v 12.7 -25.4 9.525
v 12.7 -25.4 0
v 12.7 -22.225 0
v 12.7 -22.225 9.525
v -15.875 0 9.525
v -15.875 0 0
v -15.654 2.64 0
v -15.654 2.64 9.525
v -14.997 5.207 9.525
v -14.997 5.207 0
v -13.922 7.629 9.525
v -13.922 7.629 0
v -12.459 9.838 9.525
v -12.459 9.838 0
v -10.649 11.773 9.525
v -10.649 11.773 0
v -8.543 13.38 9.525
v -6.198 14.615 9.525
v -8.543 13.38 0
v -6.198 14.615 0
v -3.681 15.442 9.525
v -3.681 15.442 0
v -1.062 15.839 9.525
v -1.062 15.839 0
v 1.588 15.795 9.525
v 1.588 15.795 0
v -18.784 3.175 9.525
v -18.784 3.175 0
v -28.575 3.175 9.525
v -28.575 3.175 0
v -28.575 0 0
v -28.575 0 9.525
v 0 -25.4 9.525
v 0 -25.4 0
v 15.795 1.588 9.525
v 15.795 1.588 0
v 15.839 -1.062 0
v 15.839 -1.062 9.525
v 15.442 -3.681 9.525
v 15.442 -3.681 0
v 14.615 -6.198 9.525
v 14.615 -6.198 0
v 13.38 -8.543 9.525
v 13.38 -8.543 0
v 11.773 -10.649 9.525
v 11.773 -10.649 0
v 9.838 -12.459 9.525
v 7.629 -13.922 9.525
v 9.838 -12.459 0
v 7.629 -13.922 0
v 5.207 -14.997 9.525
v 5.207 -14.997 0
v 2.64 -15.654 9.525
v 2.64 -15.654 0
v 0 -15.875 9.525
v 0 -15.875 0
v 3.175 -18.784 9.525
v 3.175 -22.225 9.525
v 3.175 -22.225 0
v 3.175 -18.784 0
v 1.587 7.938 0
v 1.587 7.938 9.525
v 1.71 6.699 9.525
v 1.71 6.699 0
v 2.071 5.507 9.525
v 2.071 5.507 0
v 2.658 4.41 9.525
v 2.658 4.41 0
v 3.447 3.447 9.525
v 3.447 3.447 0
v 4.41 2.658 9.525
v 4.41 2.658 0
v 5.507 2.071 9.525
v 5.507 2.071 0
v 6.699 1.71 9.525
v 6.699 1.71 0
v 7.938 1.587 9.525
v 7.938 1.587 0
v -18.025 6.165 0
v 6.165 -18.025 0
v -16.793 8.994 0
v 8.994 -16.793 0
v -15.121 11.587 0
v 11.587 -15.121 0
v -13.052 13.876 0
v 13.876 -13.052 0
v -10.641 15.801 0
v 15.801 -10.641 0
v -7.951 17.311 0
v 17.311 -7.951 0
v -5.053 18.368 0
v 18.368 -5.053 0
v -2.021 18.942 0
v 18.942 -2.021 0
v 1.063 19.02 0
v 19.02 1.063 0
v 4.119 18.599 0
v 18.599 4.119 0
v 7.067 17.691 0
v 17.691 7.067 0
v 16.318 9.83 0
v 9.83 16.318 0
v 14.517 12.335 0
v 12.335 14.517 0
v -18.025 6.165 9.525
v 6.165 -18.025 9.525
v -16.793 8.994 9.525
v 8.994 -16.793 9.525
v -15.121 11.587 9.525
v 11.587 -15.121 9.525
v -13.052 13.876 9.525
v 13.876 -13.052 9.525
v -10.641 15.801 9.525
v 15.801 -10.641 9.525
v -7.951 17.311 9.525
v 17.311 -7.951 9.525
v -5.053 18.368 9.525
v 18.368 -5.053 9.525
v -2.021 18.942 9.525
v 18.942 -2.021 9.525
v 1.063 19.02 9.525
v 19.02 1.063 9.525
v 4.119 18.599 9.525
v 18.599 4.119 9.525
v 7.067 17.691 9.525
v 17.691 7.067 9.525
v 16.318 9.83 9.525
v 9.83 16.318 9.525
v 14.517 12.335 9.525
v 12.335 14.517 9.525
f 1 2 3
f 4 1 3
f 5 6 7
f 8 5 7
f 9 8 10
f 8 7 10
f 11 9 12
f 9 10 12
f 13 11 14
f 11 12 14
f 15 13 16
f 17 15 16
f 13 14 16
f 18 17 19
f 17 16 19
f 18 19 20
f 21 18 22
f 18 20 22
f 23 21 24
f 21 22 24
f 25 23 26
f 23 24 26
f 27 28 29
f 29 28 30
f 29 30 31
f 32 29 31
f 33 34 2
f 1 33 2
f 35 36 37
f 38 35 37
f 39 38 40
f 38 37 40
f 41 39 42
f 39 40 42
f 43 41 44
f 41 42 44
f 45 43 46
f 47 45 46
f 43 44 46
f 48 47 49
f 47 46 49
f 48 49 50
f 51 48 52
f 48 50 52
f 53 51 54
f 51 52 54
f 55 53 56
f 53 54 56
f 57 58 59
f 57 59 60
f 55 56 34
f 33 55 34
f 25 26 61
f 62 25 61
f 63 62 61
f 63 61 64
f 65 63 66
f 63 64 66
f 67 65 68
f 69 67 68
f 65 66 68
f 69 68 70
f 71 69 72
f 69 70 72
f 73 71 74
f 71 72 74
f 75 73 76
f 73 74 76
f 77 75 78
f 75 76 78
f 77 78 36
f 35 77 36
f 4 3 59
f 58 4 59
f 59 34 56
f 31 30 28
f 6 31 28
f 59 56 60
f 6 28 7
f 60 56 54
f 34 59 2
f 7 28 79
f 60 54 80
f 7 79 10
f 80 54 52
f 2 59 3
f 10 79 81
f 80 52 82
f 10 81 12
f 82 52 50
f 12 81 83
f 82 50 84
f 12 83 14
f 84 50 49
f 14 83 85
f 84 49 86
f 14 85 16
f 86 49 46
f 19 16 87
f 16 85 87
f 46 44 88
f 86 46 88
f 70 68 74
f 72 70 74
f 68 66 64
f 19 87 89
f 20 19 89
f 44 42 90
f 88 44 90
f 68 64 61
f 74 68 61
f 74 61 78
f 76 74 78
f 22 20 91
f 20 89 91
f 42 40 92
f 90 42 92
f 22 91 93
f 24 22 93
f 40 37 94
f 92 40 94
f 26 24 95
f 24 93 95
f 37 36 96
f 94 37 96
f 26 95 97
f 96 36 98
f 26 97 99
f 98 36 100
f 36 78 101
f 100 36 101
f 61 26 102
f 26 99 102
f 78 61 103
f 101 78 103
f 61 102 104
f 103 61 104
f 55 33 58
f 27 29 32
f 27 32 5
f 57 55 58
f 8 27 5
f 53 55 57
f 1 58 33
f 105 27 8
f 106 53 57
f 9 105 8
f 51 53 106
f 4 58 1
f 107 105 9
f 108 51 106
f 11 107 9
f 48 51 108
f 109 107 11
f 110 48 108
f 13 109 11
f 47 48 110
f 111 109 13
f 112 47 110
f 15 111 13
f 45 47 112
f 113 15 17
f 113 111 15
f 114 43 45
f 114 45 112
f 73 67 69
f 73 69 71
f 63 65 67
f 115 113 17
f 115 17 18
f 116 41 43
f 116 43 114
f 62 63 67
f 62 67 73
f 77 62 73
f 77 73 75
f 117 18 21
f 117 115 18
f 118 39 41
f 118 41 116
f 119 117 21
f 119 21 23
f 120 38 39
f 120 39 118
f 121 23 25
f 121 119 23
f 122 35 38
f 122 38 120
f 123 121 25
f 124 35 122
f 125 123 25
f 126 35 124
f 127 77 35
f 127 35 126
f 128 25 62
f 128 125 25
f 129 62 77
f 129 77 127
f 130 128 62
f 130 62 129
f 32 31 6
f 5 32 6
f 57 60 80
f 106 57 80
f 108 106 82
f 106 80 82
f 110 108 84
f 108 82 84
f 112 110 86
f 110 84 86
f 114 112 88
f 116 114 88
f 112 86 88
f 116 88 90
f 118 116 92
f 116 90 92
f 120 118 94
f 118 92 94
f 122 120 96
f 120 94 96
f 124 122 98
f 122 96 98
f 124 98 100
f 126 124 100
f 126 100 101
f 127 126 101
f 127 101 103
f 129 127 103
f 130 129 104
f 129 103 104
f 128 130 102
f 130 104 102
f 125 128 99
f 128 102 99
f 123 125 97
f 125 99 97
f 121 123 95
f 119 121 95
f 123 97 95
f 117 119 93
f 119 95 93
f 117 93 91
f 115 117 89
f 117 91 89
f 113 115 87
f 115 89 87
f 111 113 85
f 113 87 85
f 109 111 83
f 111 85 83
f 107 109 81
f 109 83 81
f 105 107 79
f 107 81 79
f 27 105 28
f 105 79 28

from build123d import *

# Parameters (mm, degrees)
F1_DEPTH = 9.525


with BuildPart() as f1:
    # F0 (on Top) → F1 (new body)
    with BuildSketch(Plane.XY):
        with BuildLine():
            ThreePointArc((15.795426, 1.5875), (11.773215, -10.649274), (0, -15.875))
            Line((0, -15.875), (0, -25.4))
            Line((0, -25.4), (12.7, -25.4))
            Line((12.7, -25.4), (12.7, -22.225))
            Line((12.7, -22.225), (3.175, -22.225))
            Line((3.175, -22.225), (3.175, -18.783553))
            ThreePointArc((3.175, -18.783553), (13.470384, 13.470384), (-18.783553, 3.175))
            Line((-18.783553, 3.175), (-28.575, 3.175))
            Line((-28.575, 3.175), (-28.575, 0))
            Line((-28.575, 0), (-15.875, 0))
            ThreePointArc((-15.875, 0), (-10.649274, 11.773215), (1.5875, 15.795426))
            Line((1.5875, 15.795426), (1.5875, 7.9375))
            ThreePointArc((1.5875, 7.9375), (3.447372, 3.447372), (7.9375, 1.5875))
            Line((7.9375, 1.5875), (15.795426, 1.5875))
        make_face()
    extrude(amount=F1_DEPTH)


solid = f1.part
